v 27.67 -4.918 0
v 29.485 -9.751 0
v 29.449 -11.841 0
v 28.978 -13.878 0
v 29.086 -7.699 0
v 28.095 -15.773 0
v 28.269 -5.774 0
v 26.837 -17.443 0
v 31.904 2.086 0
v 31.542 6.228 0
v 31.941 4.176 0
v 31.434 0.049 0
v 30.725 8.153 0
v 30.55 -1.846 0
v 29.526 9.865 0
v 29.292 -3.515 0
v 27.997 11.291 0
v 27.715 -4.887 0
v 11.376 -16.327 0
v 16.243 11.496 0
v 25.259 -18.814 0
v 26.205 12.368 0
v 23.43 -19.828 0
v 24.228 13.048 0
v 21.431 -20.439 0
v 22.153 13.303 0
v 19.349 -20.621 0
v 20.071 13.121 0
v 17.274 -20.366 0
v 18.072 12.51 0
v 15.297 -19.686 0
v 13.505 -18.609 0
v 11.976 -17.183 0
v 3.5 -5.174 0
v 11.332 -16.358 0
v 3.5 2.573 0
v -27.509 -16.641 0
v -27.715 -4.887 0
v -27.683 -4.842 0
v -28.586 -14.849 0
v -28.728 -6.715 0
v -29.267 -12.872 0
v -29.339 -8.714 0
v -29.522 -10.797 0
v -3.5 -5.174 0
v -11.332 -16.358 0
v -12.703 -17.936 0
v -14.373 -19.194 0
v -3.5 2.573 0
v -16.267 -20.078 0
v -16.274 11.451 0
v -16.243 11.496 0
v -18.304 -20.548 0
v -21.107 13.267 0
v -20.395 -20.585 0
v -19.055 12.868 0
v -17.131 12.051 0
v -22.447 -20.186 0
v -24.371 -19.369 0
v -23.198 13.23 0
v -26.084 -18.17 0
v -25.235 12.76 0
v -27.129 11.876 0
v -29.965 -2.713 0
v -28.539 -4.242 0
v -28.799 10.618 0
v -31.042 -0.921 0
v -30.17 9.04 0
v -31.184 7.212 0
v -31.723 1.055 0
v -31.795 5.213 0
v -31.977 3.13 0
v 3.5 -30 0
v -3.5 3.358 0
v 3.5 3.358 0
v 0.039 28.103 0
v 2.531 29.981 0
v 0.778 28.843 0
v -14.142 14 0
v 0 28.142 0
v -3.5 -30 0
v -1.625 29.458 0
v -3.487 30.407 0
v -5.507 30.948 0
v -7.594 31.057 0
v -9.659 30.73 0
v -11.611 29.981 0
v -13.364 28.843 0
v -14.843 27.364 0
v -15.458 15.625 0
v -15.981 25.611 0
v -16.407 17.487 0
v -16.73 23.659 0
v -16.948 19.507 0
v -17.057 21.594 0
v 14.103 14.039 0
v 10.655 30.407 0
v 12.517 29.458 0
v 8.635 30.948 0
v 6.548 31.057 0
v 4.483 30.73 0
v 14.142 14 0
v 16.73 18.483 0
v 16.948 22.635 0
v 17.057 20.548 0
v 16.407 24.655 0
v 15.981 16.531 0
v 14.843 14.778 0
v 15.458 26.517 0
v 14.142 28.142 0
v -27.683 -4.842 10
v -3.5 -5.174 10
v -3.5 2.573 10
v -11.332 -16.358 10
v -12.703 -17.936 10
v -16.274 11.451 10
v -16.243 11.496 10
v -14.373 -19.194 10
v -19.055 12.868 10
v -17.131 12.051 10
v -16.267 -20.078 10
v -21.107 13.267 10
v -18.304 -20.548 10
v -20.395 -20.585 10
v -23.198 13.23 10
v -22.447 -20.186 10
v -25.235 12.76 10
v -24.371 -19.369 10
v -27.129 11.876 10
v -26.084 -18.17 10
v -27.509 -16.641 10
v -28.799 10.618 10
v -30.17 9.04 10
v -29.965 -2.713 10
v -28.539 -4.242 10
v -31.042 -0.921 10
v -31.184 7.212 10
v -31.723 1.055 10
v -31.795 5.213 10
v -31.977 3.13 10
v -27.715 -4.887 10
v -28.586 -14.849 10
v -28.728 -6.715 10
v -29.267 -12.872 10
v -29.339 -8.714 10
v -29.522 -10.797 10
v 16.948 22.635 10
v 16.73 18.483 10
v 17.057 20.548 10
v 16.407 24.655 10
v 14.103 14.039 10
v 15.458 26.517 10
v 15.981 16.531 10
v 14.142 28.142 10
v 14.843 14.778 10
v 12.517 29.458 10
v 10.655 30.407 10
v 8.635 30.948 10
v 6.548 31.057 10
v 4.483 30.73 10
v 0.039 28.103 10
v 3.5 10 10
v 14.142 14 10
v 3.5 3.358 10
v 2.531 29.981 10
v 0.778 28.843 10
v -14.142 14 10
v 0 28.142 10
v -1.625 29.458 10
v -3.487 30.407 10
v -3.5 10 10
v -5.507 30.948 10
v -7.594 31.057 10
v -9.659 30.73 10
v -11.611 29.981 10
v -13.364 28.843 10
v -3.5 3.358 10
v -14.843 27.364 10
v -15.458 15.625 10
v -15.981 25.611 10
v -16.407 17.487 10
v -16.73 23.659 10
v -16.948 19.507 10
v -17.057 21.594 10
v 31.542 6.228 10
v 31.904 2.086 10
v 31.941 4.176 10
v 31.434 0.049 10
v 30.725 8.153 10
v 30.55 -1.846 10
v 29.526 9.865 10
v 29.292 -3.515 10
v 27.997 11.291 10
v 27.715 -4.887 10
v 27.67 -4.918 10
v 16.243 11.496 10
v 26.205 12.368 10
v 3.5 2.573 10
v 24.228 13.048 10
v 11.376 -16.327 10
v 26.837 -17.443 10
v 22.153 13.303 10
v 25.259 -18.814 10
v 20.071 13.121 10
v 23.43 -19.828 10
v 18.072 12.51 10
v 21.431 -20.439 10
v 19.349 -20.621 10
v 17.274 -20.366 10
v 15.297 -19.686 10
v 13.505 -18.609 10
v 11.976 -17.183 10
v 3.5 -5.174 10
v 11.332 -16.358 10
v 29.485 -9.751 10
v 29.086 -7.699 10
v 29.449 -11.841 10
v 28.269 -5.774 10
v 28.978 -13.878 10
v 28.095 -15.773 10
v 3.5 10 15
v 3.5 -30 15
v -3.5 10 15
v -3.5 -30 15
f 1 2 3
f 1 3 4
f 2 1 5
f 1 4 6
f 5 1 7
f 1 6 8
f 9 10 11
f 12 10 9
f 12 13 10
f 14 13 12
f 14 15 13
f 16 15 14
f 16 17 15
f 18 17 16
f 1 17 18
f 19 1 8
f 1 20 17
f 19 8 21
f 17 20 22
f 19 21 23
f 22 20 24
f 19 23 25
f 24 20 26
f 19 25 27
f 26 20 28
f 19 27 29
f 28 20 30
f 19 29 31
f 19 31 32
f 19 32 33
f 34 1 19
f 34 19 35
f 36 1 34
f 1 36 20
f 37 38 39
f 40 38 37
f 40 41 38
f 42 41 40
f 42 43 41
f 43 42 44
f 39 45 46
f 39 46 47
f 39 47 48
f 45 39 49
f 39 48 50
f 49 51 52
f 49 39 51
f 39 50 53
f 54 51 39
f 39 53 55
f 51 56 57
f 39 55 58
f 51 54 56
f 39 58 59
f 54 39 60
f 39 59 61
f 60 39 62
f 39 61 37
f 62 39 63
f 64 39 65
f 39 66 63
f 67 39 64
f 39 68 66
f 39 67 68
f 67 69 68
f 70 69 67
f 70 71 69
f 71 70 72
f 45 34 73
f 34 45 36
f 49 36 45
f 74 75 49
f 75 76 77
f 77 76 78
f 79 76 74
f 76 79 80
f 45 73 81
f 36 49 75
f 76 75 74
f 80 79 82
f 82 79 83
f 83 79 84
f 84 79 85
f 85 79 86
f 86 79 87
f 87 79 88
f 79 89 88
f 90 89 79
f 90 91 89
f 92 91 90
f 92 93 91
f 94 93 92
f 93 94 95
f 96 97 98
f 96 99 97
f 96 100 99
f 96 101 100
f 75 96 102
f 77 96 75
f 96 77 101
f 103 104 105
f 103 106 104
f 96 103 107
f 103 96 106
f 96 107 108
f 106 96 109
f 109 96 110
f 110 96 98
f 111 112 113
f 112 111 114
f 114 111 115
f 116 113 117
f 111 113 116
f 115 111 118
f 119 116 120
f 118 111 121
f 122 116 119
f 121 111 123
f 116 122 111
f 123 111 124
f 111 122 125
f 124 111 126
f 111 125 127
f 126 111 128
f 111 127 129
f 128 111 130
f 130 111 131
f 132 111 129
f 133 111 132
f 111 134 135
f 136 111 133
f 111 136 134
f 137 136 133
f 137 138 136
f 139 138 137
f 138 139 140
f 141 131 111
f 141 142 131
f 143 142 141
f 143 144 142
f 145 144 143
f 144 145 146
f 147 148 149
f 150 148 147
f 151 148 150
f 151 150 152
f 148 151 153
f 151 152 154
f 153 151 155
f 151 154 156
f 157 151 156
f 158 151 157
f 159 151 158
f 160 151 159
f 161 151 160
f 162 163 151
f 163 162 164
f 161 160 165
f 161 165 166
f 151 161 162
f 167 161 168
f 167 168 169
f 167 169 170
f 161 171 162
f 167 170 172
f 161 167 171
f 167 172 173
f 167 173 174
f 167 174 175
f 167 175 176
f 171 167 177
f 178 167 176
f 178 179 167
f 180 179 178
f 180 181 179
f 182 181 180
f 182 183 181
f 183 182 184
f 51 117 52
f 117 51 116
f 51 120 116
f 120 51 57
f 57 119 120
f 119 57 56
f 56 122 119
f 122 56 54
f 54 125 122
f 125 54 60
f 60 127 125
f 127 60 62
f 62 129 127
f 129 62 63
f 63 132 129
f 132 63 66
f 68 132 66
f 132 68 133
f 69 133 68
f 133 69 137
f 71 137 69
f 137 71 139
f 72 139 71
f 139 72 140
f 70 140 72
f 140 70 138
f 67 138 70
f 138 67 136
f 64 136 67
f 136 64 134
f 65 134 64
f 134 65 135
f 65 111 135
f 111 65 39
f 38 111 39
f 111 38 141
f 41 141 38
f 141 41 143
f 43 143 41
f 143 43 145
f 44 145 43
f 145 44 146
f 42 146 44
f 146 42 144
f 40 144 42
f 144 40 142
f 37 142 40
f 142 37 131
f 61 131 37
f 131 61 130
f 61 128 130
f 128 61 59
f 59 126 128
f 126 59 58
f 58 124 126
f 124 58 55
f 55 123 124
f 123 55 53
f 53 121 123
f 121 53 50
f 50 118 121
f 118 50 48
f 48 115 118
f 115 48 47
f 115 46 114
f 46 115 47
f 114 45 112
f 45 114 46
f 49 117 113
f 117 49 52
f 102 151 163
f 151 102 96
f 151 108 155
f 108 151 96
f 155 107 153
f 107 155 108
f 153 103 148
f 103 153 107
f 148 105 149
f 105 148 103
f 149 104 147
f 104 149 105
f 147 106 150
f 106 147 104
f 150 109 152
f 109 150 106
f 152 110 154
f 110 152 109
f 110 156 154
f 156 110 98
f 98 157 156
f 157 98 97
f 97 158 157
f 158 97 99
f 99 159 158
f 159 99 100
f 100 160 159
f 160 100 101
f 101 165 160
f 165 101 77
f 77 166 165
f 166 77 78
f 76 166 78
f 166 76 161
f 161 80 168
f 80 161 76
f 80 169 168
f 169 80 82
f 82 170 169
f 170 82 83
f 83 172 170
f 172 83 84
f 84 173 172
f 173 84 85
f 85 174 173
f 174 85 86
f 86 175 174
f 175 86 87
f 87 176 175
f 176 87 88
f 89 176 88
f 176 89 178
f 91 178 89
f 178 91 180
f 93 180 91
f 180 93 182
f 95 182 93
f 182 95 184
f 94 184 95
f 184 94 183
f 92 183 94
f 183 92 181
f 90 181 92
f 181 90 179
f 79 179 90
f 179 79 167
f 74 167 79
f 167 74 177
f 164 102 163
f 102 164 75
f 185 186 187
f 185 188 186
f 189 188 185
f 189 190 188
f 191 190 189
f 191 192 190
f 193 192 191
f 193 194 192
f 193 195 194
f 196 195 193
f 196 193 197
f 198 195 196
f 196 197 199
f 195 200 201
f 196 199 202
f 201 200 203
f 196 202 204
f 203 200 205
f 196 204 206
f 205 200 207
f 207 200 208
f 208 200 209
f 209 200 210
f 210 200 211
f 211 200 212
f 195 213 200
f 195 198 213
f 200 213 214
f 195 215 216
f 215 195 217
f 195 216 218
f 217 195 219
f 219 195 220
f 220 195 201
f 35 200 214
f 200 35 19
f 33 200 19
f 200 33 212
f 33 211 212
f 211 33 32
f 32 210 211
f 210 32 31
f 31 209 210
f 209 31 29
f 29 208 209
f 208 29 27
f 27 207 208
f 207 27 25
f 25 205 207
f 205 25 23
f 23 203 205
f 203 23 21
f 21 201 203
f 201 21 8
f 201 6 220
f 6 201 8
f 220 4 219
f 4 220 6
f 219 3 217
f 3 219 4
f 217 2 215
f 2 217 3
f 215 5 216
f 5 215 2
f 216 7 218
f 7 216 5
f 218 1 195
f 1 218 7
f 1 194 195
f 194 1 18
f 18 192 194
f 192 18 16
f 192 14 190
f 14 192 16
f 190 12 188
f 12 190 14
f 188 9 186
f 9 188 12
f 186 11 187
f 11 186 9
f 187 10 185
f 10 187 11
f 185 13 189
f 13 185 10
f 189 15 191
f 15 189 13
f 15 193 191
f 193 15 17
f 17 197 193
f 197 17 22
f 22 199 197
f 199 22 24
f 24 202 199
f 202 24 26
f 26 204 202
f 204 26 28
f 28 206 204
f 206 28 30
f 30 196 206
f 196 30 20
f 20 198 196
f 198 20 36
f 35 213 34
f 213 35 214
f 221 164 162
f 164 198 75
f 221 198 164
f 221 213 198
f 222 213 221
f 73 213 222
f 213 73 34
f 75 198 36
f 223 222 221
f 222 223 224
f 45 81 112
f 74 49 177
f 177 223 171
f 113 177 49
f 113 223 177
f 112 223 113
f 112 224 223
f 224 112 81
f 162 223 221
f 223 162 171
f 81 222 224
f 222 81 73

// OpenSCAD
// file: ../heart/heart.scad
module flatHeart()
{
	square(20, center = true);
	
	translate([10,0,0])	
	circle(10, center = true, color="red" );
	
	translate([0,10,0]) 
	circle(10, center = true);
}

module raisedHeart()
{
	rotate ([0, 0, 45])
	linear_extrude(height=10)
	flatHeart();
}

translate ([0, 14, 0])
raisedHeart();
// main file
use <../heart/heart.scad>;



module flatClover(sideHeartRotation = 100)
{
	union () 
	{ 
		rotate ([0, 0, sideHeartRotation])
		translate ([0,14,0])
		raisedHeart();
		
		rotate ([0, 0, 0])
		translate ([0,14,0])
		raisedHeart();
		
		rotate ([0, 0, -sideHeartRotation])
		translate ([0, 14, 0])
		raisedHeart();
		
//		color ("red")
		translate([-3.5,-30,0])
		cube (size = [7, 40, 15]);
	}
}

module raisedClover()
{
//	linear_extrude (height = 10)
	flatClover();
}

raisedClover();
